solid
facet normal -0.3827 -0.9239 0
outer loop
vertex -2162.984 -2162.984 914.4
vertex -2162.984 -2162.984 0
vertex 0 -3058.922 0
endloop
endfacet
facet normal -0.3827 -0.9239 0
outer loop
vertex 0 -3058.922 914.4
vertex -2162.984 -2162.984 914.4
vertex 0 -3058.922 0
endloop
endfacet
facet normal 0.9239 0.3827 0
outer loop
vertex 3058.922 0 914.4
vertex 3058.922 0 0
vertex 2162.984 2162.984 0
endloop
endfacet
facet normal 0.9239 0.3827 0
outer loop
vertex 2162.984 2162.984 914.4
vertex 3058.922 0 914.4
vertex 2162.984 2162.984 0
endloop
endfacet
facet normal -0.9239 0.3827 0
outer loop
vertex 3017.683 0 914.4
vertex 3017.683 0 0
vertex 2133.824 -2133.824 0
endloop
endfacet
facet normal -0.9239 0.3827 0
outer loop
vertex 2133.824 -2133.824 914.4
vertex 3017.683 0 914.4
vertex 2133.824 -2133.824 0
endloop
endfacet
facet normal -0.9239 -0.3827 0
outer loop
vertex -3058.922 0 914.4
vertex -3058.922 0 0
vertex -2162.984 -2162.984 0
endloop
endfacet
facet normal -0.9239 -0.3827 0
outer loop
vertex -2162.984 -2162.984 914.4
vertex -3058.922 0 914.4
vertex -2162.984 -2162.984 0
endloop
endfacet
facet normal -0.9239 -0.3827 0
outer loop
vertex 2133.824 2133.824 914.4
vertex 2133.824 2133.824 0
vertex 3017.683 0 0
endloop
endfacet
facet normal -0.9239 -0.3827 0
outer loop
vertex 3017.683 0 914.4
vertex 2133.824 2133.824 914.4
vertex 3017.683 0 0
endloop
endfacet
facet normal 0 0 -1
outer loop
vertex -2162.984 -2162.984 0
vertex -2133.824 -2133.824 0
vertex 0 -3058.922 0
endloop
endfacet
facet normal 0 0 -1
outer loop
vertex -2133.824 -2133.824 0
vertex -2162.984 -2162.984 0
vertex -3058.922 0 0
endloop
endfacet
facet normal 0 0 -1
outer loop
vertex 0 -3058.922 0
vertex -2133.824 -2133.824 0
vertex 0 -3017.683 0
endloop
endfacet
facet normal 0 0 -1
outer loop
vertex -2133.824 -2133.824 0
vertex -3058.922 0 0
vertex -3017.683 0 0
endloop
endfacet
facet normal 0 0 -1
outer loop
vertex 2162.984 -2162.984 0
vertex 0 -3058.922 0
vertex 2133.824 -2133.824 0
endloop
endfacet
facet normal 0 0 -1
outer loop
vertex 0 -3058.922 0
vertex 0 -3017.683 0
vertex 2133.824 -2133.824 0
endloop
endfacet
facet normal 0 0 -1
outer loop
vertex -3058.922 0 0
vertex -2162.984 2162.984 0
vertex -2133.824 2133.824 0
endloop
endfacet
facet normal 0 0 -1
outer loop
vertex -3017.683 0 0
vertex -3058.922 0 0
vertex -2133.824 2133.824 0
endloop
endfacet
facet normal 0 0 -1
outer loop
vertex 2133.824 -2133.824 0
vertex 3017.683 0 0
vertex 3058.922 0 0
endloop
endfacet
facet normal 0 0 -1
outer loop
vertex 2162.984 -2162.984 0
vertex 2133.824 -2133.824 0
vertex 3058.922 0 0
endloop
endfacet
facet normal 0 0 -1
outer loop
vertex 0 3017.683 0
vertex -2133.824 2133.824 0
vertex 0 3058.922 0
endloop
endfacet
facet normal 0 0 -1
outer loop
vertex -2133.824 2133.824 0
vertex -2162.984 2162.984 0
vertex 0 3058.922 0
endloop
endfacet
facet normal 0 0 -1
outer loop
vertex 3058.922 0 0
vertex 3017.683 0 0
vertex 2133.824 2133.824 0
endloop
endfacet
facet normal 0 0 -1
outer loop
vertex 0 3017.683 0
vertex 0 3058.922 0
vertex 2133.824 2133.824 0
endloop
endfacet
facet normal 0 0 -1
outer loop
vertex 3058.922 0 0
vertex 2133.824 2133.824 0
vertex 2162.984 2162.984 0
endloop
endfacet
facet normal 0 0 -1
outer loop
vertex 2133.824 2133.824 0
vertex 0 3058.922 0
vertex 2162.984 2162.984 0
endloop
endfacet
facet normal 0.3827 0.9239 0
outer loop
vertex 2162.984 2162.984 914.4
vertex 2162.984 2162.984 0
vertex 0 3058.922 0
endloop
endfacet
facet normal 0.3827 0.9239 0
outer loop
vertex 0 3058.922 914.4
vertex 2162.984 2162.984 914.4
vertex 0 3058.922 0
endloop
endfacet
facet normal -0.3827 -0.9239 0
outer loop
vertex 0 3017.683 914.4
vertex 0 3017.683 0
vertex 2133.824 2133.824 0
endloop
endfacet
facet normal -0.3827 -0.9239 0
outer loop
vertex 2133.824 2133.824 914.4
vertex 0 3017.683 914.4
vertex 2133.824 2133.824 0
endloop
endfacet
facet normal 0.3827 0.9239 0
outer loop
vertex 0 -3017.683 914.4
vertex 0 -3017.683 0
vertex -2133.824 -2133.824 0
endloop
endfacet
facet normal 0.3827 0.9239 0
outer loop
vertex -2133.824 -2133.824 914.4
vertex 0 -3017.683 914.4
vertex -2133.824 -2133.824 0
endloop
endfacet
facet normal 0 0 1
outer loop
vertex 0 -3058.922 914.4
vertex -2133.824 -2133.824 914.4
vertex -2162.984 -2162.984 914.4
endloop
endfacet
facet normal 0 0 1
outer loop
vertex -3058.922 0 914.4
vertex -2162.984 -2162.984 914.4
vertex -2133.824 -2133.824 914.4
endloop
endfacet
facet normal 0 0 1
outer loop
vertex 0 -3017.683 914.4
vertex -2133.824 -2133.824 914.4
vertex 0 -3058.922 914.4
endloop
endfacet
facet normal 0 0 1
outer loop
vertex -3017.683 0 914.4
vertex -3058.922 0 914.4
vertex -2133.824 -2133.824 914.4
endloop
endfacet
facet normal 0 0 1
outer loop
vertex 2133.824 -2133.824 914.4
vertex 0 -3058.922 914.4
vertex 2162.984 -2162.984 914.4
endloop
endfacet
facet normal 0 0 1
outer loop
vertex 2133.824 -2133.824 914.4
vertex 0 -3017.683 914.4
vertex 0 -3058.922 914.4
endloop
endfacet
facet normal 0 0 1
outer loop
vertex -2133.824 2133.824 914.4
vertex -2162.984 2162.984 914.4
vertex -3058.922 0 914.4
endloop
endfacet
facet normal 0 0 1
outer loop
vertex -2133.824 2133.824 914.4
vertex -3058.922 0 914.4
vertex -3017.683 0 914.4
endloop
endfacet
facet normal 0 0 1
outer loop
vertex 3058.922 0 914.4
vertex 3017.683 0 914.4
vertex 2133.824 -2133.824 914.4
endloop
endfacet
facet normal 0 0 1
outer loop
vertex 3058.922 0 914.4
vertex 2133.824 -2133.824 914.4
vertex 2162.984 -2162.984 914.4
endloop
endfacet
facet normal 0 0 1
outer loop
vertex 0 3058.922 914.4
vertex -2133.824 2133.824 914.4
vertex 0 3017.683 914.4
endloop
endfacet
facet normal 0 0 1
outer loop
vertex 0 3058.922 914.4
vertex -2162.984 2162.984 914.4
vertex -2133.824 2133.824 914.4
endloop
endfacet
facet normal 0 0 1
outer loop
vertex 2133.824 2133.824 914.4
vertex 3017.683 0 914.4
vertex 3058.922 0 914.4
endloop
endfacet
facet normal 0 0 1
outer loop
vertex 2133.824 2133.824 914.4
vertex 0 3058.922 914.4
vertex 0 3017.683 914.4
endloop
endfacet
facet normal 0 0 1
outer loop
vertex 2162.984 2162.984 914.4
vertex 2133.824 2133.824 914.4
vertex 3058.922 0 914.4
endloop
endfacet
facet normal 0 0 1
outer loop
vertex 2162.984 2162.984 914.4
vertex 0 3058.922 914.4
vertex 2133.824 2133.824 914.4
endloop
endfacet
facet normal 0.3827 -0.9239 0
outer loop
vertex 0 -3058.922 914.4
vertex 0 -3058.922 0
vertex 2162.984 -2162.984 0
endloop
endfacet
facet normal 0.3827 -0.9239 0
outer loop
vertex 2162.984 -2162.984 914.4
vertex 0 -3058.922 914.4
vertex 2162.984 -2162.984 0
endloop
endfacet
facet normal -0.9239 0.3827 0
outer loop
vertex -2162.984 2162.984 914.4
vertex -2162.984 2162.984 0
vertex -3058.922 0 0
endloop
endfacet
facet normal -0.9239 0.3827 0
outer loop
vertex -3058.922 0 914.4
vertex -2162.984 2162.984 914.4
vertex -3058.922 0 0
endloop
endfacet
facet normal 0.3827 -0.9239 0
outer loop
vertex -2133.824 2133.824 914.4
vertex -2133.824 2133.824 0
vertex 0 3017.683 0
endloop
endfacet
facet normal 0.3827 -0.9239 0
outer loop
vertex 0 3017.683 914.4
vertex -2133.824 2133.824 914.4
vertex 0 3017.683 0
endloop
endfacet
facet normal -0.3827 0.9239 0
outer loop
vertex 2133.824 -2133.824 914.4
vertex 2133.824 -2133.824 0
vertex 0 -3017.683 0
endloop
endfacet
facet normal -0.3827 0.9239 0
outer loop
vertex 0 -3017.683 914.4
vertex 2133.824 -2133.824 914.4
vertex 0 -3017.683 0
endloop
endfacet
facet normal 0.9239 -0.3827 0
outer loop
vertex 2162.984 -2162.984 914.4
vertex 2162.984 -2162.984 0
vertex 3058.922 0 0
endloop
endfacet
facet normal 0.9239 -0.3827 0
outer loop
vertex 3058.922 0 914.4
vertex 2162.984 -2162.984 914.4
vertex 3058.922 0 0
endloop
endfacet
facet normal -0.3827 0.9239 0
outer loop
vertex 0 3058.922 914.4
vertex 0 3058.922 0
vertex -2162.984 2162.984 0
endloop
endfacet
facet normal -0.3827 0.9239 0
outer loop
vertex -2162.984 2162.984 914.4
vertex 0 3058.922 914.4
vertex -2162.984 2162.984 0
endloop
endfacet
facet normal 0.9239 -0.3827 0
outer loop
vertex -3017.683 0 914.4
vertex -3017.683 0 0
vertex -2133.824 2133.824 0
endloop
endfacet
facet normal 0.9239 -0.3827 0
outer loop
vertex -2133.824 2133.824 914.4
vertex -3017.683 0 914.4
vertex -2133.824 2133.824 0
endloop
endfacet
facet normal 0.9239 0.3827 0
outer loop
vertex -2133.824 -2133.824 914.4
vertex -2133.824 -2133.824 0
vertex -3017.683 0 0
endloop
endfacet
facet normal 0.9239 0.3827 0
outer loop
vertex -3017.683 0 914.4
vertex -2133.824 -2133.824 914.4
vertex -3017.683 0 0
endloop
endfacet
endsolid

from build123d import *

# Parameters (mm, degrees)
F1_DEPTH = 914.4


with BuildPart() as f1:
    # F0 (on Top) → F1 (new body)
    with BuildSketch(Plane.XY):
        Polygon((0, 3017.682857), (0, 3058.922), (-2162.984489, 2162.984489), (-2133.824012, 2133.824012), align=None)
        Polygon((2133.824012, 2133.824012), (2162.984489, 2162.984489), (0, 3058.922), (0, 3017.682857), align=None)
        Polygon((3017.682857, 0), (3058.922, 0), (2162.984489, 2162.984489), (2133.824012, 2133.824012), align=None)
        Polygon((0, -3058.922), (2162.984489, -2162.984489), (2133.824012, -2133.824012), (0, -3017.682857), align=None)
        Polygon((2162.984489, -2162.984489), (3058.922, 0), (3017.682857, 0), (2133.824012, -2133.824012), align=None)
        Polygon((-2162.984489, -2162.984489), (0, -3058.922), (0, -3017.682857), (-2133.824012, -2133.824012), align=None)
        Polygon((-3058.922, 0), (-2162.984489, -2162.984489), (-2133.824012, -2133.824012), (-3017.682857, 0), align=None)
        Polygon((-2133.824012, 2133.824012), (-2162.984489, 2162.984489), (-3058.922, 0), (-3017.682857, 0), align=None)
    extrude(amount=F1_DEPTH)


solid = f1.part
